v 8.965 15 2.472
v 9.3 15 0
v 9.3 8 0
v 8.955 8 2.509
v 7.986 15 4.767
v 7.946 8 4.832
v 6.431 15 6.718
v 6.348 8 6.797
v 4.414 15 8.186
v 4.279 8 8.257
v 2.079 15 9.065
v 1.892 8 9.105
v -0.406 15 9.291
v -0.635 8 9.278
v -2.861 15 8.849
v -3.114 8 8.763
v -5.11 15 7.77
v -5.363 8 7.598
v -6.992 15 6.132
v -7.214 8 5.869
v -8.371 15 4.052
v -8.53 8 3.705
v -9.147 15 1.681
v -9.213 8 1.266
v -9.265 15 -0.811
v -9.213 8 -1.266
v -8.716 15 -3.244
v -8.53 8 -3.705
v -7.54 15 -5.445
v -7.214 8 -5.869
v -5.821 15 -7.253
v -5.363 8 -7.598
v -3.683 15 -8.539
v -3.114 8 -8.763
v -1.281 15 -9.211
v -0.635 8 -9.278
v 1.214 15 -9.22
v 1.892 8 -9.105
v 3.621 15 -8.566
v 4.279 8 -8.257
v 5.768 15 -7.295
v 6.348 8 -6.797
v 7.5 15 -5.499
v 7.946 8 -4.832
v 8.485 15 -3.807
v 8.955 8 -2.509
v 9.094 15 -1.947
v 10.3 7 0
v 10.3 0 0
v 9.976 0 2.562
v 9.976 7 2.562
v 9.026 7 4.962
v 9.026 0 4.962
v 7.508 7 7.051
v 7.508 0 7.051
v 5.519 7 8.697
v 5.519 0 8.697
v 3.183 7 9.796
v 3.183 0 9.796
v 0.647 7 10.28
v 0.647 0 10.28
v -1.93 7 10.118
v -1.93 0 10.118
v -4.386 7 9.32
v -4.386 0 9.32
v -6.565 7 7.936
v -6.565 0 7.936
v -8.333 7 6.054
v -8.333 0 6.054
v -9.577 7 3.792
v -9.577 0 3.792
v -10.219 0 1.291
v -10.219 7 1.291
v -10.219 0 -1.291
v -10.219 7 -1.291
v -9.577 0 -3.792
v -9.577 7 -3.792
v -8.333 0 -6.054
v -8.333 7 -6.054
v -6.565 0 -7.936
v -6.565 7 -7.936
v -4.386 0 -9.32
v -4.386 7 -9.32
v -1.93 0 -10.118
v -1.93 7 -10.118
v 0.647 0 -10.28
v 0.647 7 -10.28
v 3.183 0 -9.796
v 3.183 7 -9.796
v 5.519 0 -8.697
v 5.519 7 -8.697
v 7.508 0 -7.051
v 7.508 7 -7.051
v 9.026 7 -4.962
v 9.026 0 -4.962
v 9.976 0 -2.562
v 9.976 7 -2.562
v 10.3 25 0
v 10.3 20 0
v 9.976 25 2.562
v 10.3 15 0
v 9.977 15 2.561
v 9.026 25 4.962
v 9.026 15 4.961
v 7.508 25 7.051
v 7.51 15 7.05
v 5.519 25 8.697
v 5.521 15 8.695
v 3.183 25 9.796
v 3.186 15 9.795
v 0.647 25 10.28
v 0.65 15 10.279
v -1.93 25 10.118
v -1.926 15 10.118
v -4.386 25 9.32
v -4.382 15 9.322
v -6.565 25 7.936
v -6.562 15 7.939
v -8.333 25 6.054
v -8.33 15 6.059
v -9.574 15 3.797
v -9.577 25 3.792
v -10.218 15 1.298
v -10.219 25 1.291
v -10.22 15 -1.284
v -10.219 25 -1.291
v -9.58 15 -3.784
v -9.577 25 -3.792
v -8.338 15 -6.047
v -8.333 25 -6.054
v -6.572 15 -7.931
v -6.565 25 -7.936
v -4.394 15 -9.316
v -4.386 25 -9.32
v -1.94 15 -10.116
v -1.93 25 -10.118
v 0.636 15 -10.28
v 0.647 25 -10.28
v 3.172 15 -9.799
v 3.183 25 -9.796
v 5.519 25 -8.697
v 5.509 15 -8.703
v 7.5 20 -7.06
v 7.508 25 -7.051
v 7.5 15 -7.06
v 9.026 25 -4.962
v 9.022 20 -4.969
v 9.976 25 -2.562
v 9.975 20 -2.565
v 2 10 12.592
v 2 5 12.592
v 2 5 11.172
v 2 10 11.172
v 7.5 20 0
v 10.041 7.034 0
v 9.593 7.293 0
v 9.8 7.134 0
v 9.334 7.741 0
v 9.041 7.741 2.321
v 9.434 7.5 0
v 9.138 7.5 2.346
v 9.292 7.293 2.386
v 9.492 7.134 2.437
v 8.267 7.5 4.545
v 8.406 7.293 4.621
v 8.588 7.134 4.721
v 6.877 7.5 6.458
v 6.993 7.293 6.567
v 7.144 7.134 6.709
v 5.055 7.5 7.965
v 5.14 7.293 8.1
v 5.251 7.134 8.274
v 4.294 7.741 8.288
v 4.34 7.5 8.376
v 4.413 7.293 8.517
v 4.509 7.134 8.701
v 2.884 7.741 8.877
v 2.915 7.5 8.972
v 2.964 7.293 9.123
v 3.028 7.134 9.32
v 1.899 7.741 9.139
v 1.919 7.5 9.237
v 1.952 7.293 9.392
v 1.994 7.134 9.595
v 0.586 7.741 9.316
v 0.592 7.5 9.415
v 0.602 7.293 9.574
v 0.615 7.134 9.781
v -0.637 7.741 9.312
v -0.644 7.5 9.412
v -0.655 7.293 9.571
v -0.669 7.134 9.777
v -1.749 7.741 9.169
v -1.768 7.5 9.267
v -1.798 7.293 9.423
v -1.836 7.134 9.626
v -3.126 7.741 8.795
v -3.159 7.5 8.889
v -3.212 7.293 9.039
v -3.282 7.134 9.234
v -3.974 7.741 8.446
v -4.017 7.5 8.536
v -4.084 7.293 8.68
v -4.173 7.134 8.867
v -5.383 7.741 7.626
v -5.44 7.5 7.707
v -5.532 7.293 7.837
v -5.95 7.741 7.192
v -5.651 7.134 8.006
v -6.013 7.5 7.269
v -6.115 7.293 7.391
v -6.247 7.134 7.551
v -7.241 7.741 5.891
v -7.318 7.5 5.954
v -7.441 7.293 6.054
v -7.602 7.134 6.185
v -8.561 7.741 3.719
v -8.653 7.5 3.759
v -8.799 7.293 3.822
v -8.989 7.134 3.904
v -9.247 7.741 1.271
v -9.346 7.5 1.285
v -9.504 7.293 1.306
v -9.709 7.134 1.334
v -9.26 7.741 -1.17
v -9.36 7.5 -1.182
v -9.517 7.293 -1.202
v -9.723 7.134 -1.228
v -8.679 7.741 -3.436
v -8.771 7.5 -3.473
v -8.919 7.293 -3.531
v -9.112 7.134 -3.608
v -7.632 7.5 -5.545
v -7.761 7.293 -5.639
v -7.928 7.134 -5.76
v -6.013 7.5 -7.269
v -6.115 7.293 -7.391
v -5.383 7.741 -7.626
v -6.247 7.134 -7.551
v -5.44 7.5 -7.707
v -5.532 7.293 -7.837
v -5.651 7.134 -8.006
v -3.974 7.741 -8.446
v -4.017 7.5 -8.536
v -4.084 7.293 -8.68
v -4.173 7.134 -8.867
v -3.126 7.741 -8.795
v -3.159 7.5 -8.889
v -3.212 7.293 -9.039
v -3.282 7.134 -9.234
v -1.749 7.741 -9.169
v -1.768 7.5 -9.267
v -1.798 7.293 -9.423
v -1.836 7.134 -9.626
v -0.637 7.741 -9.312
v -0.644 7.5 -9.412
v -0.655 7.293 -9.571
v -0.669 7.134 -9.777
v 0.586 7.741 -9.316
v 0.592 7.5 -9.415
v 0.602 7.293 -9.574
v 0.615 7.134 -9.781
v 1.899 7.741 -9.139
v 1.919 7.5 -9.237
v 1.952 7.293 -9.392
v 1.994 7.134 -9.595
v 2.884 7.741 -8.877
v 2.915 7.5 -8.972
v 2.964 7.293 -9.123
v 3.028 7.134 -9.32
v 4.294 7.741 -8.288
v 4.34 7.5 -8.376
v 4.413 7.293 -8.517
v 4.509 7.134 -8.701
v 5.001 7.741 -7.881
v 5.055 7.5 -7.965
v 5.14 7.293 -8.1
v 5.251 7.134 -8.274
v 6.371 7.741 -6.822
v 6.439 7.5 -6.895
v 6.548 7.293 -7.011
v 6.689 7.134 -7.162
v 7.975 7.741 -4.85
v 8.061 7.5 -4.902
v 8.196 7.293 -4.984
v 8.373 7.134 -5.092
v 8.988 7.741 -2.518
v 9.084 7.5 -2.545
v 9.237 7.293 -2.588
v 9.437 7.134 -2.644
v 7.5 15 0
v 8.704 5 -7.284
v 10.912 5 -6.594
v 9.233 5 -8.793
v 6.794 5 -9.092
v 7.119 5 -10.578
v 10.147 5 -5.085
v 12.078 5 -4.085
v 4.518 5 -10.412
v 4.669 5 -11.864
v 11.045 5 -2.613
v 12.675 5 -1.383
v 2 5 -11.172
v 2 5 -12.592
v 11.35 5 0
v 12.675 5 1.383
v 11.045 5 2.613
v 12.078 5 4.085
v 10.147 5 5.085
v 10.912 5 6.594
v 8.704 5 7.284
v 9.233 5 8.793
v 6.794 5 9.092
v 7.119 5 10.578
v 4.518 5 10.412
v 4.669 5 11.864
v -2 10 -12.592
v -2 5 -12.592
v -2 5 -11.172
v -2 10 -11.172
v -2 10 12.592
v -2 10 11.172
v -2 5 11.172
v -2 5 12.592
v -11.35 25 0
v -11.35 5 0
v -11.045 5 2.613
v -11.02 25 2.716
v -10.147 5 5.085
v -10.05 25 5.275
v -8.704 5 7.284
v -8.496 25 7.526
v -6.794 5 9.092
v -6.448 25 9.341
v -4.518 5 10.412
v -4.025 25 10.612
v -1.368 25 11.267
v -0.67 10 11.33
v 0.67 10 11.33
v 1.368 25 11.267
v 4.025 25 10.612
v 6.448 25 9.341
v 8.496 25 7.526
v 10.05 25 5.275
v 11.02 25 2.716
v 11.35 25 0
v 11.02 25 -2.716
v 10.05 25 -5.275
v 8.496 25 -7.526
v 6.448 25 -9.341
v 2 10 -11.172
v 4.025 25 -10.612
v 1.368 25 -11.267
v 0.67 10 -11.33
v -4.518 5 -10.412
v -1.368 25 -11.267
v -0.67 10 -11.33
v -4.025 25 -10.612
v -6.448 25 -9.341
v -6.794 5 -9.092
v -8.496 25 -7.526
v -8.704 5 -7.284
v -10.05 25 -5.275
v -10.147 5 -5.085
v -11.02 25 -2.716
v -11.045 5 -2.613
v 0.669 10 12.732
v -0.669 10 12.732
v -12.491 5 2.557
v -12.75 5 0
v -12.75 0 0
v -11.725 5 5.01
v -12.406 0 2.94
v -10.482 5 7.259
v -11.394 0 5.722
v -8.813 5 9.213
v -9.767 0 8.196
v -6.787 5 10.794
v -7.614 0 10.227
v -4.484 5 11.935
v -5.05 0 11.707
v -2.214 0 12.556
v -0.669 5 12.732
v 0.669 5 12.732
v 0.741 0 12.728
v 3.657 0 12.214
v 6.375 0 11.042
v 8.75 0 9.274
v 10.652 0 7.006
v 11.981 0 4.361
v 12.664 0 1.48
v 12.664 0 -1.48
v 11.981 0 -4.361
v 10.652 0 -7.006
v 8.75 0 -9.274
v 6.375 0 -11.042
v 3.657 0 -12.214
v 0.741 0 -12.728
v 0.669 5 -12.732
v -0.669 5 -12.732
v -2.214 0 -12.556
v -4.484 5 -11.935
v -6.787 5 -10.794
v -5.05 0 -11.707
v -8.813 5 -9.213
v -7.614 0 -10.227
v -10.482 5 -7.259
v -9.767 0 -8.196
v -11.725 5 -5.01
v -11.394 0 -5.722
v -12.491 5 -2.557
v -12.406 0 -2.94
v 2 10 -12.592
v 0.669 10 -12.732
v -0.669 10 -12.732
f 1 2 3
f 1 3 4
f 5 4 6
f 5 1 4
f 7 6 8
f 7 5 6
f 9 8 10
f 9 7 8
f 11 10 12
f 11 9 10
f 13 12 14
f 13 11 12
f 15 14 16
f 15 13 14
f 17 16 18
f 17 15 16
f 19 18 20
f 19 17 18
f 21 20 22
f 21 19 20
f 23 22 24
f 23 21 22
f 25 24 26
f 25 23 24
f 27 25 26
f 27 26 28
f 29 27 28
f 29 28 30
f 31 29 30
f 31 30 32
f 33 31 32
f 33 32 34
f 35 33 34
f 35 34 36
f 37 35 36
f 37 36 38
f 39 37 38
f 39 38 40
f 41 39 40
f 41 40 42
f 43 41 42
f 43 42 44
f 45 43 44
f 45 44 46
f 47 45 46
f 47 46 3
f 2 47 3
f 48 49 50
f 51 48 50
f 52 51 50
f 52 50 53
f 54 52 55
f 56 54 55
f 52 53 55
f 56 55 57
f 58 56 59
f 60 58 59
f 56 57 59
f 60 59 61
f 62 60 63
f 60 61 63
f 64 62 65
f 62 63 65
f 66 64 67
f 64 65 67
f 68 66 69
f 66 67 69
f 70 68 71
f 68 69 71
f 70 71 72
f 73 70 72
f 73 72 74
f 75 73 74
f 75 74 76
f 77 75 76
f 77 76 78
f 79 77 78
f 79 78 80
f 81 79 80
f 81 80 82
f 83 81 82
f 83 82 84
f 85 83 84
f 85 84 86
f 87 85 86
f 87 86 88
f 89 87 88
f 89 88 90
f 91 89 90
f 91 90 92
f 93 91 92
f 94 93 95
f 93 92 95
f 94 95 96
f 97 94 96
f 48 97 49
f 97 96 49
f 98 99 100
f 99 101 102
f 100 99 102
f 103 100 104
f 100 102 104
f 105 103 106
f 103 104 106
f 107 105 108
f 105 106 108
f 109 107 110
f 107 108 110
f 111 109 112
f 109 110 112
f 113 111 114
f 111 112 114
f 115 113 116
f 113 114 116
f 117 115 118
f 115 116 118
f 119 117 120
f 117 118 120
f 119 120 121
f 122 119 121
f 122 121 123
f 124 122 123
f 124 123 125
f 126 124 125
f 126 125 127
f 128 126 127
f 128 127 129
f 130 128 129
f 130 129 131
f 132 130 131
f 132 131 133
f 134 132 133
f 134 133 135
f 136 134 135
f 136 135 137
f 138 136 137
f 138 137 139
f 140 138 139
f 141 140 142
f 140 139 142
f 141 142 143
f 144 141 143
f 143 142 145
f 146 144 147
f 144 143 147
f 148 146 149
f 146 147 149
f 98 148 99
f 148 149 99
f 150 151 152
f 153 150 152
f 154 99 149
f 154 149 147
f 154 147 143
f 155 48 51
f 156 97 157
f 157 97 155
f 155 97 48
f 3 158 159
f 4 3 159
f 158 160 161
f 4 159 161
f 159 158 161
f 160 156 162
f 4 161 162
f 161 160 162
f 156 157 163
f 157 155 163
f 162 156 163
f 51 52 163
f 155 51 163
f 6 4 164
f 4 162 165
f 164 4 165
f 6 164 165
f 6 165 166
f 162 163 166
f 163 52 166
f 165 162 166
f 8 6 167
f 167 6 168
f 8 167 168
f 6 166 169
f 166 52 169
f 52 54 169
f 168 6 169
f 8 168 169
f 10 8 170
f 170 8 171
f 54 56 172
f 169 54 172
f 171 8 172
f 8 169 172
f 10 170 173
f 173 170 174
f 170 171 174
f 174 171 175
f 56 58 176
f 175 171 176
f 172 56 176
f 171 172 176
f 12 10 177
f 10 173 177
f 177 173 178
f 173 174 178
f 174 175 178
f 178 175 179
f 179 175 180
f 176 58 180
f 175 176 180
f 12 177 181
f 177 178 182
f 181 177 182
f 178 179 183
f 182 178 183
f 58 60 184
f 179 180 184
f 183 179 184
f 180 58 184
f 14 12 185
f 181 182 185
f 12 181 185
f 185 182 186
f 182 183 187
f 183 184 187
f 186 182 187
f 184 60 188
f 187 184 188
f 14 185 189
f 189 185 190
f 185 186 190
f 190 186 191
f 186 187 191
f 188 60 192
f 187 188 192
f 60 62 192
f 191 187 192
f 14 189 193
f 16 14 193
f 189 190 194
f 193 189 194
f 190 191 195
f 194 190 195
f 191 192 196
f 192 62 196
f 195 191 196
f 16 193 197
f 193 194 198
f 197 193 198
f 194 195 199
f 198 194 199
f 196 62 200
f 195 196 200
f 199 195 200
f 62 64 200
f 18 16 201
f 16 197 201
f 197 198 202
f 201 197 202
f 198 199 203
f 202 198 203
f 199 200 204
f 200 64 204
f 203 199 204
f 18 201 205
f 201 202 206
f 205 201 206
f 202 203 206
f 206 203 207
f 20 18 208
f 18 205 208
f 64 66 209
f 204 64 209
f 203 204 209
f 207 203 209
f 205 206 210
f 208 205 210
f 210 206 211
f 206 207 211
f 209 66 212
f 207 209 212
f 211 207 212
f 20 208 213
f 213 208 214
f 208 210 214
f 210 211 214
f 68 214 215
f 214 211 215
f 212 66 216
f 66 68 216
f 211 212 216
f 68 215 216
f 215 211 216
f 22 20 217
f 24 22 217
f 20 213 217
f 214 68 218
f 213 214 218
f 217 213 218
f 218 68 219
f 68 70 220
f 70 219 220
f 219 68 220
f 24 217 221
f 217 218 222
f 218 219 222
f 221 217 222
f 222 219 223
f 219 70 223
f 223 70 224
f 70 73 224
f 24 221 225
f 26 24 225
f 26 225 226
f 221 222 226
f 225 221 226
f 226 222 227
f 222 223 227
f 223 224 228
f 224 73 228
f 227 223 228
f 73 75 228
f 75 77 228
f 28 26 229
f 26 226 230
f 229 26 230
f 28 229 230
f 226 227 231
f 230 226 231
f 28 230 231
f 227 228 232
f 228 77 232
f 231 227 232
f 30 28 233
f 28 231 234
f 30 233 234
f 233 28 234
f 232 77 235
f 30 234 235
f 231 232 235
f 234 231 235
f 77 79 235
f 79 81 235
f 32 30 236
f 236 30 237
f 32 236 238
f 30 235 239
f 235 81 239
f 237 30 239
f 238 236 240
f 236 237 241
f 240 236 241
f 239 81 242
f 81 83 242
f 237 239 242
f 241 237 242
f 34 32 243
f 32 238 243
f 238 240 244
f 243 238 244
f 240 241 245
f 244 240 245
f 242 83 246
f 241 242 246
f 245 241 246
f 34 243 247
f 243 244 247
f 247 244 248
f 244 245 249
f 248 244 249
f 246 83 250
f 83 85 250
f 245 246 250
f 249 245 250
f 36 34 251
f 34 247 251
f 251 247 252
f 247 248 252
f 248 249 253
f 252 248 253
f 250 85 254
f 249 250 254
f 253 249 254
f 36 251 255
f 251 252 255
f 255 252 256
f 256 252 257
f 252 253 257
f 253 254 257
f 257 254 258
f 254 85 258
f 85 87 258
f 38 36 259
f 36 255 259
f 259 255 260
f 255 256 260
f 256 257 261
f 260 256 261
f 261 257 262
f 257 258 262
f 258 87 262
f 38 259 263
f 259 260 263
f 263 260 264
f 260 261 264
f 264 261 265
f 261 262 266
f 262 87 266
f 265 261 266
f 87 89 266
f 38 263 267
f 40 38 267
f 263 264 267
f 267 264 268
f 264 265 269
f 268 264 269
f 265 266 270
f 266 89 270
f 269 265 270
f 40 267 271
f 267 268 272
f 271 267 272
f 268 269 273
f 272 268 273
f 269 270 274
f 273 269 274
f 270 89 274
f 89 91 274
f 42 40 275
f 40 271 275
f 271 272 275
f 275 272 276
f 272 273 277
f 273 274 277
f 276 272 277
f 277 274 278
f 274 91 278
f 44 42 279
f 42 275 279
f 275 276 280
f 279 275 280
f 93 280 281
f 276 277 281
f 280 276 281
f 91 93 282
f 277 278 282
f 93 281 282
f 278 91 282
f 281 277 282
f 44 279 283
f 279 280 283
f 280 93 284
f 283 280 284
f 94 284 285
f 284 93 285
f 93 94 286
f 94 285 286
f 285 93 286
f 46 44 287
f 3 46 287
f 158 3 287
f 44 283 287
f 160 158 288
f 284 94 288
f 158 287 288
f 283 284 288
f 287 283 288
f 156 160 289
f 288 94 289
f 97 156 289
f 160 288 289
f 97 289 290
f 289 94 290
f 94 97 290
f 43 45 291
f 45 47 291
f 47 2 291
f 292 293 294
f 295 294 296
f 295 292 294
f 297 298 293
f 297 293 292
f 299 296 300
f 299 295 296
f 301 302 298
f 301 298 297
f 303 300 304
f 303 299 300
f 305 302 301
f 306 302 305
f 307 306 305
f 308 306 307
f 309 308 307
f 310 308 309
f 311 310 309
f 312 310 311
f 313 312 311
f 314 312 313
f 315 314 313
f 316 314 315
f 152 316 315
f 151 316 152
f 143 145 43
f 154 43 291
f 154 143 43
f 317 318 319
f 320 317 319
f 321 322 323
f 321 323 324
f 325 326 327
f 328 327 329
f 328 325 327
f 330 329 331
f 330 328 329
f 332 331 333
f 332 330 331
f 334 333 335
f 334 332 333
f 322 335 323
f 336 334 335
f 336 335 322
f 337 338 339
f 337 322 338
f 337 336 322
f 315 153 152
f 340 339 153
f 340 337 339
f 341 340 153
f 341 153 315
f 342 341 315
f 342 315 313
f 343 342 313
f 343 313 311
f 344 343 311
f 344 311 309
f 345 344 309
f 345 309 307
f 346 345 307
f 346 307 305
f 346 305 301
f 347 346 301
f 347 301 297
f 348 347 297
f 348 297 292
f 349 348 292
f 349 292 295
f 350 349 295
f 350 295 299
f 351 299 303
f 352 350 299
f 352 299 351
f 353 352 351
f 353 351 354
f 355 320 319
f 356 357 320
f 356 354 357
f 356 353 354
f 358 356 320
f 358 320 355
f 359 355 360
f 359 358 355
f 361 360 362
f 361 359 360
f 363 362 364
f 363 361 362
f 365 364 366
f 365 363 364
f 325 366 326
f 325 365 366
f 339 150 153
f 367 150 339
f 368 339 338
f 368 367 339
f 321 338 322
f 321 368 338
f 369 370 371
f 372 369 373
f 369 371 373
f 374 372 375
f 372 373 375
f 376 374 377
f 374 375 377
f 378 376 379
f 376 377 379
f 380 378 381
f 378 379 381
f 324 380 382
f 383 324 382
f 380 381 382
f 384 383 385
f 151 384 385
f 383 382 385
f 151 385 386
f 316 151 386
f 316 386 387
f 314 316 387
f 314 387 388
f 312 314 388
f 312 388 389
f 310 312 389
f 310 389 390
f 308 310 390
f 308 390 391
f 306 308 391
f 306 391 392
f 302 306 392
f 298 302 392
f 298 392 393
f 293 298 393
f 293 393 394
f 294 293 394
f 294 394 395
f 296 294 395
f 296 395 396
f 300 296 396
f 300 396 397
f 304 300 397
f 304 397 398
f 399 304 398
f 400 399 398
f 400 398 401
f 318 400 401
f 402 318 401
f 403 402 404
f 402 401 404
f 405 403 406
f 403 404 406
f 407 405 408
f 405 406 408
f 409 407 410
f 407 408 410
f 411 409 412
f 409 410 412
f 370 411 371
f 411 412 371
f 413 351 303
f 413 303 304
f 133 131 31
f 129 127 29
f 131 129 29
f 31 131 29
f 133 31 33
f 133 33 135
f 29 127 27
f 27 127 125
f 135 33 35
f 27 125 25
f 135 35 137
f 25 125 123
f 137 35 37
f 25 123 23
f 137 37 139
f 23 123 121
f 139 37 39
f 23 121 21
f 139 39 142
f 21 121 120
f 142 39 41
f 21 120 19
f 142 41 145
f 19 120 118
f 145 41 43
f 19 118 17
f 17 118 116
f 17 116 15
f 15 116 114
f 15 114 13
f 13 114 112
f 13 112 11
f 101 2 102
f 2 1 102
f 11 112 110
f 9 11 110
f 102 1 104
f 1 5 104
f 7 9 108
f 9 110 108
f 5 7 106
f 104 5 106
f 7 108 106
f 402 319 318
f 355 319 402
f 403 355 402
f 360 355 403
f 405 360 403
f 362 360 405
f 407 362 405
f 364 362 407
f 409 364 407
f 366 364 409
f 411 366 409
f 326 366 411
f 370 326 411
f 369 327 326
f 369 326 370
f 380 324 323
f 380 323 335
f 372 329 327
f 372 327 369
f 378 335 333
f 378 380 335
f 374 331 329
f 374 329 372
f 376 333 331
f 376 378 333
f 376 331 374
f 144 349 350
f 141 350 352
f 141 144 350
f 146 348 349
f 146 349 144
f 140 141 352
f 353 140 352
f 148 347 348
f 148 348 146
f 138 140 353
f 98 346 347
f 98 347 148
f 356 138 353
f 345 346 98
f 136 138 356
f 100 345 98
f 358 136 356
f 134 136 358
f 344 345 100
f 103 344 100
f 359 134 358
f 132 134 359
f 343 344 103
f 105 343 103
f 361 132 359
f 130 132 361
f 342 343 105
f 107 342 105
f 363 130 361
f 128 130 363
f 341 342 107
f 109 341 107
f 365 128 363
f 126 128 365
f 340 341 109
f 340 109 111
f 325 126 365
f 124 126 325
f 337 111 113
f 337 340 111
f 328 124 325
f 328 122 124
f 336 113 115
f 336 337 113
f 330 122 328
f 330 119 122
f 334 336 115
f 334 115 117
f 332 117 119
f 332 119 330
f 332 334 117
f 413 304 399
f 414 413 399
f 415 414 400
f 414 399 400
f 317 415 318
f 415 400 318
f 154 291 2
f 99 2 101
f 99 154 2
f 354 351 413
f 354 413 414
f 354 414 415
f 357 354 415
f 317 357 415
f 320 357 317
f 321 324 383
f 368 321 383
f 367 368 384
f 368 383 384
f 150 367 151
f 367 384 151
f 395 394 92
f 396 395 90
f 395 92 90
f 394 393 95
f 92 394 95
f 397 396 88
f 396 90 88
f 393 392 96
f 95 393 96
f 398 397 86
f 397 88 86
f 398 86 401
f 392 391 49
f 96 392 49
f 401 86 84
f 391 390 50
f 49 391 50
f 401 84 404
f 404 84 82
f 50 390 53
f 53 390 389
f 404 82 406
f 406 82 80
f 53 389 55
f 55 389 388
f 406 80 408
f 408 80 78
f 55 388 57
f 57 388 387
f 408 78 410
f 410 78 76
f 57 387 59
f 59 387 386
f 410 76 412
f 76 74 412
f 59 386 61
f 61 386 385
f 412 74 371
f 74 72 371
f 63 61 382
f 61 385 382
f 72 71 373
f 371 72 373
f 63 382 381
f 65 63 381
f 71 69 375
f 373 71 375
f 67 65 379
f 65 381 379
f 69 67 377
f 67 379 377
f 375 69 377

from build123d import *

# Parameters (mm, degrees)
F0_R         = 10.3
F1_DEPTH     = 9
F3_R         = 3.1
F4_DEPTH     = 9.001
F6_DEPTH     = 1.8
F7_T4_ANGLE  = 359.64
F7_S5_R      = 3.1
F7_T6_DEPTH  = 5
F7_T10_ANGLE = 359.64
F7_S11_R     = 3.1
F7_T12_DEPTH = 5
F7_T16_ANGLE = 359.64
F7_S17_R     = 3.1
F7_T18_DEPTH = 5
F9_R         = 12.75
F10_DEPTH    = 25
F11_R        = 3.1
F12_DEPTH    = 34.0010001
F13_R        = 12.75
F13_R_2      = 11.35
F14_DEPTH    = 20
F16_DEPTH    = 5
F17_R        = 10.3
F18_DEPTH    = 34.0010001
F20_START    = -5
F20_DEPTH    = 5
F21_R        = 10.3
F21_R_2      = 9.3
F22_DEPTH    = 8
F23_R        = 0.99999


# Not quite as in the source:
# - a fillet or chamfer that OpenCascade refuses, or shapes differently, is made with other operations: its cross-section is extruded or revolved along the edge and cut away or added
# - a fillet or chamfer is up to 0.001 mm smaller than in the source, because OpenCascade refuses the exact size


with BuildPart() as f1:
    # F0 (on Front) → F1 (new body)
    with BuildSketch(Plane.XZ):
        Circle(F0_R)
    extrude(amount=F1_DEPTH)

    # F3 (on face) → F4 (cut, through all)
    with BuildSketch(Plane.XZ.offset(9)):
        Circle(F3_R)
    extrude(amount=-F4_DEPTH, mode=Mode.SUBTRACT)

    # F5 (on face) → F6 (cut)
    with BuildSketch(Plane.XZ.offset(9)):
        with BuildLine():
            ThreePointArc((-3.0819681678, 0.333874546), (-2.6846787517, 1.55), (-1.8301279224, 2.502125454))
            ThreePointArc((-1.8301279224, 2.502125454), (-6.4951905284, 3.75), (-3.0819681678, 0.333874546))
        make_face()
        with BuildLine():
            ThreePointArc((6.8301270189, 2.5), (4.331189746, 4.9999997741), (1.8301279224, 2.502125454))
            ThreePointArc((1.8301279224, 2.502125454), (2.6846787517, 1.55), (3.0819681678, 0.333874546))
            ThreePointArc((3.0819681678, 0.333874546), (5.5810472546, 0.3354680497), (6.8301270189, 2.5))
        make_face()
        with BuildLine():
            ThreePointArc((1.2518402454, -2.836), (0, -3.1), (-1.2518402454, -2.836))
            ThreePointArc((-1.2518402454, -2.836), (-1.2490795384, -7.1655946774), (2.5, -5))
            ThreePointArc((2.5, -5), (2.1655946774, -3.7509204616), (1.2518402454, -2.836))
        make_face()
    extrude(amount=-F6_DEPTH, mode=Mode.SUBTRACT)

    # F7: fillet of radius 1 on 3 edges, made by hand


with BuildPart() as f7_tool2:
    # F7_s3 → F7_t4 (revolve)
    with BuildSketch(Plane(origin=(0.0078111935, 0, 0.0136280797), x_dir=(0, 1, 0), z_dir=(-0.497276838, 0, -0.8675919239))):
        with BuildLine():
            ThreePointArc((-8.2, -2.499975326), (-7.4928932188, -2.7928685448), (-7.2, -3.499975326))
            Line((-7.2, -3.499975326), (-7.18, -3.499975326))
            Line((-7.18, -3.499975326), (-7.18, -2.479975326))
            Line((-7.18, -2.479975326), (-8.2, -2.479975326))
            Line((-8.2, -2.479975326), (-8.2, -2.499975326))
        make_face()
    revolve(axis=Axis((-4.3301270189, -7.2, 2.5), (0, -1, 0)), revolution_arc=F7_T4_ANGLE)

    # F7_s5 → F7_t6 (cut, symmetric)
    with BuildSketch(Plane.XZ.offset(7.7)):
        Circle(F7_S5_R)
    extrude(amount=F7_T6_DEPTH, both=True, mode=Mode.SUBTRACT)


with BuildPart() as f1_1:
    add(f1.part)

    # F7_t1: union F7_tool2
    add(f7_tool2.part)


with BuildPart() as f7_tool8:
    # F7_s9 → F7_t10 (revolve)
    with BuildSketch(Plane(origin=(0.0078966665, 0, -0.0135787318), x_dir=(0, 1, 0), z_dir=(-0.5027182272, 0, 0.8644503364))):
        with BuildLine():
            ThreePointArc((-8.2, -2.499975326), (-7.4928932188, -2.7928685448), (-7.2, -3.499975326))
            Line((-7.2, -3.499975326), (-7.18, -3.499975326))
            Line((-7.18, -3.499975326), (-7.18, -2.479975326))
            Line((-7.18, -2.479975326), (-8.2, -2.479975326))
            Line((-8.2, -2.479975326), (-8.2, -2.499975326))
        make_face()
    revolve(axis=Axis((4.3301270189, -7.2, 2.5), (0, -1, 0)), revolution_arc=F7_T10_ANGLE)

    # F7_s11 → F7_t12 (cut, symmetric)
    with BuildSketch(Plane.XZ.offset(7.7)):
        Circle(F7_S11_R)
    extrude(amount=F7_T12_DEPTH, both=True, mode=Mode.SUBTRACT)


with BuildPart() as f1_2:
    add(f1_1.part)

    # F7_t7: union F7_tool8
    add(f7_tool8.part)


with BuildPart() as f7_tool14:
    # F7_s15 → F7_t16 (revolve)
    with BuildSketch(Plane(origin=(-0.0157078599, 0, -4.93479e-05), x_dir=(0, 1, 0), z_dir=(0.9999950652, 0, 0.0031415875))):
        with BuildLine():
            ThreePointArc((-8.2, -2.499975326), (-7.4928932188, -2.7928685448), (-7.2, -3.499975326))
            Line((-7.2, -3.499975326), (-7.18, -3.499975326))
            Line((-7.18, -3.499975326), (-7.18, -2.479975326))
            Line((-7.18, -2.479975326), (-8.2, -2.479975326))
            Line((-8.2, -2.479975326), (-8.2, -2.499975326))
        make_face()
    revolve(axis=Axis((0, -7.2, -5), (0, -1, 0)), revolution_arc=F7_T16_ANGLE)

    # F7_s17 → F7_t18 (cut, symmetric)
    with BuildSketch(Plane.XZ.offset(7.7)):
        Circle(F7_S17_R)
    extrude(amount=F7_T18_DEPTH, both=True, mode=Mode.SUBTRACT)


with BuildPart() as f1_3:
    add(f1_2.part)

    # F7_t13: union F7_tool14
    add(f7_tool14.part)

    # F9 (on offset) → F10 (join)
    with BuildSketch(Plane(origin=(0, 0, 0), x_dir=(-1, 0, 0), z_dir=(0, 1, 0))):
        Circle(F9_R)
    extrude(amount=F10_DEPTH)

    # F11 (on face) → F12 (cut, through all)
    with BuildSketch(Plane(origin=(0, 25, 0), x_dir=(-1, 0, 0), z_dir=(0, 1, 0))):
        Circle(F11_R)
    extrude(amount=-F12_DEPTH, mode=Mode.SUBTRACT)

    # F13 (on face) → F14 (cut)
    with BuildSketch(Plane(origin=(0, 25, 0), x_dir=(-1, 0, 0), z_dir=(0, 1, 0))):
        Circle(F13_R)
        Circle(F13_R_2, mode=Mode.SUBTRACT)
    extrude(amount=-F14_DEPTH, mode=Mode.SUBTRACT)

    # F15 (on face) → F16 (join)
    with BuildSketch(Plane(origin=(0, 5, 0), x_dir=(-1, 0, 0), z_dir=(0, 1, 0))):
        with BuildLine():
            ThreePointArc((2, 12.5921602595), (0, 12.75), (-2, 12.5921602595))
            Line((-2, 12.5921602595), (-2, 11.1723990262))
            ThreePointArc((-2, 11.1723990262), (0, 11.35), (2, 11.1723990262))
            Line((2, 11.1723990262), (2, 12.5921602595))
        make_face()
        with BuildLine():
            ThreePointArc((2, -11.1723990262), (0, -11.35), (-2, -11.1723990262))
            Line((-2, -11.1723990262), (-2, -12.5921602595))
            ThreePointArc((-2, -12.5921602595), (0, -12.75), (2, -12.5921602595))
            Line((2, -12.5921602595), (2, -11.1723990262))
        make_face()
    extrude(amount=F16_DEPTH)

    # F17 (on face) → F18 (cut, through all)
    with BuildSketch(Plane.XZ.offset(9)):
        Circle(F17_R)
    extrude(amount=-F18_DEPTH, mode=Mode.SUBTRACT)

    # F19 (on face) → F20 (join)
    with BuildSketch(Plane(origin=(0, 25, 0), x_dir=(-1, 0, 0), z_dir=(0, 1, 0)).offset(F20_START)):
        with BuildLine():
            Line((-7.5, 0), (-10.3, 0))
            ThreePointArc((-10.3, 0), (-9.5744451536, -3.7973675092), (-7.5, -7.0597450379))
            Line((-7.5, -7.0597450379), (-7.5, 0))
        make_face()
    extrude(amount=-F20_DEPTH)

    # F21 (on face) → F22 (join)
    with BuildSketch(Plane.XZ.offset(-15)):
        Circle(F21_R)
        Circle(F21_R_2, mode=Mode.SUBTRACT)
    extrude(amount=F22_DEPTH)

    # F23 (radius 1 in the source; OpenCascade refuses exactly that, so slightly less here)
    f23_edges = [f1_3.edges().sort_by_distance(p)[0] for p in [
        (-9.3, 7, 0),
    ]]
    fillet(f23_edges, radius=F23_R)


solid = f1_3.part
